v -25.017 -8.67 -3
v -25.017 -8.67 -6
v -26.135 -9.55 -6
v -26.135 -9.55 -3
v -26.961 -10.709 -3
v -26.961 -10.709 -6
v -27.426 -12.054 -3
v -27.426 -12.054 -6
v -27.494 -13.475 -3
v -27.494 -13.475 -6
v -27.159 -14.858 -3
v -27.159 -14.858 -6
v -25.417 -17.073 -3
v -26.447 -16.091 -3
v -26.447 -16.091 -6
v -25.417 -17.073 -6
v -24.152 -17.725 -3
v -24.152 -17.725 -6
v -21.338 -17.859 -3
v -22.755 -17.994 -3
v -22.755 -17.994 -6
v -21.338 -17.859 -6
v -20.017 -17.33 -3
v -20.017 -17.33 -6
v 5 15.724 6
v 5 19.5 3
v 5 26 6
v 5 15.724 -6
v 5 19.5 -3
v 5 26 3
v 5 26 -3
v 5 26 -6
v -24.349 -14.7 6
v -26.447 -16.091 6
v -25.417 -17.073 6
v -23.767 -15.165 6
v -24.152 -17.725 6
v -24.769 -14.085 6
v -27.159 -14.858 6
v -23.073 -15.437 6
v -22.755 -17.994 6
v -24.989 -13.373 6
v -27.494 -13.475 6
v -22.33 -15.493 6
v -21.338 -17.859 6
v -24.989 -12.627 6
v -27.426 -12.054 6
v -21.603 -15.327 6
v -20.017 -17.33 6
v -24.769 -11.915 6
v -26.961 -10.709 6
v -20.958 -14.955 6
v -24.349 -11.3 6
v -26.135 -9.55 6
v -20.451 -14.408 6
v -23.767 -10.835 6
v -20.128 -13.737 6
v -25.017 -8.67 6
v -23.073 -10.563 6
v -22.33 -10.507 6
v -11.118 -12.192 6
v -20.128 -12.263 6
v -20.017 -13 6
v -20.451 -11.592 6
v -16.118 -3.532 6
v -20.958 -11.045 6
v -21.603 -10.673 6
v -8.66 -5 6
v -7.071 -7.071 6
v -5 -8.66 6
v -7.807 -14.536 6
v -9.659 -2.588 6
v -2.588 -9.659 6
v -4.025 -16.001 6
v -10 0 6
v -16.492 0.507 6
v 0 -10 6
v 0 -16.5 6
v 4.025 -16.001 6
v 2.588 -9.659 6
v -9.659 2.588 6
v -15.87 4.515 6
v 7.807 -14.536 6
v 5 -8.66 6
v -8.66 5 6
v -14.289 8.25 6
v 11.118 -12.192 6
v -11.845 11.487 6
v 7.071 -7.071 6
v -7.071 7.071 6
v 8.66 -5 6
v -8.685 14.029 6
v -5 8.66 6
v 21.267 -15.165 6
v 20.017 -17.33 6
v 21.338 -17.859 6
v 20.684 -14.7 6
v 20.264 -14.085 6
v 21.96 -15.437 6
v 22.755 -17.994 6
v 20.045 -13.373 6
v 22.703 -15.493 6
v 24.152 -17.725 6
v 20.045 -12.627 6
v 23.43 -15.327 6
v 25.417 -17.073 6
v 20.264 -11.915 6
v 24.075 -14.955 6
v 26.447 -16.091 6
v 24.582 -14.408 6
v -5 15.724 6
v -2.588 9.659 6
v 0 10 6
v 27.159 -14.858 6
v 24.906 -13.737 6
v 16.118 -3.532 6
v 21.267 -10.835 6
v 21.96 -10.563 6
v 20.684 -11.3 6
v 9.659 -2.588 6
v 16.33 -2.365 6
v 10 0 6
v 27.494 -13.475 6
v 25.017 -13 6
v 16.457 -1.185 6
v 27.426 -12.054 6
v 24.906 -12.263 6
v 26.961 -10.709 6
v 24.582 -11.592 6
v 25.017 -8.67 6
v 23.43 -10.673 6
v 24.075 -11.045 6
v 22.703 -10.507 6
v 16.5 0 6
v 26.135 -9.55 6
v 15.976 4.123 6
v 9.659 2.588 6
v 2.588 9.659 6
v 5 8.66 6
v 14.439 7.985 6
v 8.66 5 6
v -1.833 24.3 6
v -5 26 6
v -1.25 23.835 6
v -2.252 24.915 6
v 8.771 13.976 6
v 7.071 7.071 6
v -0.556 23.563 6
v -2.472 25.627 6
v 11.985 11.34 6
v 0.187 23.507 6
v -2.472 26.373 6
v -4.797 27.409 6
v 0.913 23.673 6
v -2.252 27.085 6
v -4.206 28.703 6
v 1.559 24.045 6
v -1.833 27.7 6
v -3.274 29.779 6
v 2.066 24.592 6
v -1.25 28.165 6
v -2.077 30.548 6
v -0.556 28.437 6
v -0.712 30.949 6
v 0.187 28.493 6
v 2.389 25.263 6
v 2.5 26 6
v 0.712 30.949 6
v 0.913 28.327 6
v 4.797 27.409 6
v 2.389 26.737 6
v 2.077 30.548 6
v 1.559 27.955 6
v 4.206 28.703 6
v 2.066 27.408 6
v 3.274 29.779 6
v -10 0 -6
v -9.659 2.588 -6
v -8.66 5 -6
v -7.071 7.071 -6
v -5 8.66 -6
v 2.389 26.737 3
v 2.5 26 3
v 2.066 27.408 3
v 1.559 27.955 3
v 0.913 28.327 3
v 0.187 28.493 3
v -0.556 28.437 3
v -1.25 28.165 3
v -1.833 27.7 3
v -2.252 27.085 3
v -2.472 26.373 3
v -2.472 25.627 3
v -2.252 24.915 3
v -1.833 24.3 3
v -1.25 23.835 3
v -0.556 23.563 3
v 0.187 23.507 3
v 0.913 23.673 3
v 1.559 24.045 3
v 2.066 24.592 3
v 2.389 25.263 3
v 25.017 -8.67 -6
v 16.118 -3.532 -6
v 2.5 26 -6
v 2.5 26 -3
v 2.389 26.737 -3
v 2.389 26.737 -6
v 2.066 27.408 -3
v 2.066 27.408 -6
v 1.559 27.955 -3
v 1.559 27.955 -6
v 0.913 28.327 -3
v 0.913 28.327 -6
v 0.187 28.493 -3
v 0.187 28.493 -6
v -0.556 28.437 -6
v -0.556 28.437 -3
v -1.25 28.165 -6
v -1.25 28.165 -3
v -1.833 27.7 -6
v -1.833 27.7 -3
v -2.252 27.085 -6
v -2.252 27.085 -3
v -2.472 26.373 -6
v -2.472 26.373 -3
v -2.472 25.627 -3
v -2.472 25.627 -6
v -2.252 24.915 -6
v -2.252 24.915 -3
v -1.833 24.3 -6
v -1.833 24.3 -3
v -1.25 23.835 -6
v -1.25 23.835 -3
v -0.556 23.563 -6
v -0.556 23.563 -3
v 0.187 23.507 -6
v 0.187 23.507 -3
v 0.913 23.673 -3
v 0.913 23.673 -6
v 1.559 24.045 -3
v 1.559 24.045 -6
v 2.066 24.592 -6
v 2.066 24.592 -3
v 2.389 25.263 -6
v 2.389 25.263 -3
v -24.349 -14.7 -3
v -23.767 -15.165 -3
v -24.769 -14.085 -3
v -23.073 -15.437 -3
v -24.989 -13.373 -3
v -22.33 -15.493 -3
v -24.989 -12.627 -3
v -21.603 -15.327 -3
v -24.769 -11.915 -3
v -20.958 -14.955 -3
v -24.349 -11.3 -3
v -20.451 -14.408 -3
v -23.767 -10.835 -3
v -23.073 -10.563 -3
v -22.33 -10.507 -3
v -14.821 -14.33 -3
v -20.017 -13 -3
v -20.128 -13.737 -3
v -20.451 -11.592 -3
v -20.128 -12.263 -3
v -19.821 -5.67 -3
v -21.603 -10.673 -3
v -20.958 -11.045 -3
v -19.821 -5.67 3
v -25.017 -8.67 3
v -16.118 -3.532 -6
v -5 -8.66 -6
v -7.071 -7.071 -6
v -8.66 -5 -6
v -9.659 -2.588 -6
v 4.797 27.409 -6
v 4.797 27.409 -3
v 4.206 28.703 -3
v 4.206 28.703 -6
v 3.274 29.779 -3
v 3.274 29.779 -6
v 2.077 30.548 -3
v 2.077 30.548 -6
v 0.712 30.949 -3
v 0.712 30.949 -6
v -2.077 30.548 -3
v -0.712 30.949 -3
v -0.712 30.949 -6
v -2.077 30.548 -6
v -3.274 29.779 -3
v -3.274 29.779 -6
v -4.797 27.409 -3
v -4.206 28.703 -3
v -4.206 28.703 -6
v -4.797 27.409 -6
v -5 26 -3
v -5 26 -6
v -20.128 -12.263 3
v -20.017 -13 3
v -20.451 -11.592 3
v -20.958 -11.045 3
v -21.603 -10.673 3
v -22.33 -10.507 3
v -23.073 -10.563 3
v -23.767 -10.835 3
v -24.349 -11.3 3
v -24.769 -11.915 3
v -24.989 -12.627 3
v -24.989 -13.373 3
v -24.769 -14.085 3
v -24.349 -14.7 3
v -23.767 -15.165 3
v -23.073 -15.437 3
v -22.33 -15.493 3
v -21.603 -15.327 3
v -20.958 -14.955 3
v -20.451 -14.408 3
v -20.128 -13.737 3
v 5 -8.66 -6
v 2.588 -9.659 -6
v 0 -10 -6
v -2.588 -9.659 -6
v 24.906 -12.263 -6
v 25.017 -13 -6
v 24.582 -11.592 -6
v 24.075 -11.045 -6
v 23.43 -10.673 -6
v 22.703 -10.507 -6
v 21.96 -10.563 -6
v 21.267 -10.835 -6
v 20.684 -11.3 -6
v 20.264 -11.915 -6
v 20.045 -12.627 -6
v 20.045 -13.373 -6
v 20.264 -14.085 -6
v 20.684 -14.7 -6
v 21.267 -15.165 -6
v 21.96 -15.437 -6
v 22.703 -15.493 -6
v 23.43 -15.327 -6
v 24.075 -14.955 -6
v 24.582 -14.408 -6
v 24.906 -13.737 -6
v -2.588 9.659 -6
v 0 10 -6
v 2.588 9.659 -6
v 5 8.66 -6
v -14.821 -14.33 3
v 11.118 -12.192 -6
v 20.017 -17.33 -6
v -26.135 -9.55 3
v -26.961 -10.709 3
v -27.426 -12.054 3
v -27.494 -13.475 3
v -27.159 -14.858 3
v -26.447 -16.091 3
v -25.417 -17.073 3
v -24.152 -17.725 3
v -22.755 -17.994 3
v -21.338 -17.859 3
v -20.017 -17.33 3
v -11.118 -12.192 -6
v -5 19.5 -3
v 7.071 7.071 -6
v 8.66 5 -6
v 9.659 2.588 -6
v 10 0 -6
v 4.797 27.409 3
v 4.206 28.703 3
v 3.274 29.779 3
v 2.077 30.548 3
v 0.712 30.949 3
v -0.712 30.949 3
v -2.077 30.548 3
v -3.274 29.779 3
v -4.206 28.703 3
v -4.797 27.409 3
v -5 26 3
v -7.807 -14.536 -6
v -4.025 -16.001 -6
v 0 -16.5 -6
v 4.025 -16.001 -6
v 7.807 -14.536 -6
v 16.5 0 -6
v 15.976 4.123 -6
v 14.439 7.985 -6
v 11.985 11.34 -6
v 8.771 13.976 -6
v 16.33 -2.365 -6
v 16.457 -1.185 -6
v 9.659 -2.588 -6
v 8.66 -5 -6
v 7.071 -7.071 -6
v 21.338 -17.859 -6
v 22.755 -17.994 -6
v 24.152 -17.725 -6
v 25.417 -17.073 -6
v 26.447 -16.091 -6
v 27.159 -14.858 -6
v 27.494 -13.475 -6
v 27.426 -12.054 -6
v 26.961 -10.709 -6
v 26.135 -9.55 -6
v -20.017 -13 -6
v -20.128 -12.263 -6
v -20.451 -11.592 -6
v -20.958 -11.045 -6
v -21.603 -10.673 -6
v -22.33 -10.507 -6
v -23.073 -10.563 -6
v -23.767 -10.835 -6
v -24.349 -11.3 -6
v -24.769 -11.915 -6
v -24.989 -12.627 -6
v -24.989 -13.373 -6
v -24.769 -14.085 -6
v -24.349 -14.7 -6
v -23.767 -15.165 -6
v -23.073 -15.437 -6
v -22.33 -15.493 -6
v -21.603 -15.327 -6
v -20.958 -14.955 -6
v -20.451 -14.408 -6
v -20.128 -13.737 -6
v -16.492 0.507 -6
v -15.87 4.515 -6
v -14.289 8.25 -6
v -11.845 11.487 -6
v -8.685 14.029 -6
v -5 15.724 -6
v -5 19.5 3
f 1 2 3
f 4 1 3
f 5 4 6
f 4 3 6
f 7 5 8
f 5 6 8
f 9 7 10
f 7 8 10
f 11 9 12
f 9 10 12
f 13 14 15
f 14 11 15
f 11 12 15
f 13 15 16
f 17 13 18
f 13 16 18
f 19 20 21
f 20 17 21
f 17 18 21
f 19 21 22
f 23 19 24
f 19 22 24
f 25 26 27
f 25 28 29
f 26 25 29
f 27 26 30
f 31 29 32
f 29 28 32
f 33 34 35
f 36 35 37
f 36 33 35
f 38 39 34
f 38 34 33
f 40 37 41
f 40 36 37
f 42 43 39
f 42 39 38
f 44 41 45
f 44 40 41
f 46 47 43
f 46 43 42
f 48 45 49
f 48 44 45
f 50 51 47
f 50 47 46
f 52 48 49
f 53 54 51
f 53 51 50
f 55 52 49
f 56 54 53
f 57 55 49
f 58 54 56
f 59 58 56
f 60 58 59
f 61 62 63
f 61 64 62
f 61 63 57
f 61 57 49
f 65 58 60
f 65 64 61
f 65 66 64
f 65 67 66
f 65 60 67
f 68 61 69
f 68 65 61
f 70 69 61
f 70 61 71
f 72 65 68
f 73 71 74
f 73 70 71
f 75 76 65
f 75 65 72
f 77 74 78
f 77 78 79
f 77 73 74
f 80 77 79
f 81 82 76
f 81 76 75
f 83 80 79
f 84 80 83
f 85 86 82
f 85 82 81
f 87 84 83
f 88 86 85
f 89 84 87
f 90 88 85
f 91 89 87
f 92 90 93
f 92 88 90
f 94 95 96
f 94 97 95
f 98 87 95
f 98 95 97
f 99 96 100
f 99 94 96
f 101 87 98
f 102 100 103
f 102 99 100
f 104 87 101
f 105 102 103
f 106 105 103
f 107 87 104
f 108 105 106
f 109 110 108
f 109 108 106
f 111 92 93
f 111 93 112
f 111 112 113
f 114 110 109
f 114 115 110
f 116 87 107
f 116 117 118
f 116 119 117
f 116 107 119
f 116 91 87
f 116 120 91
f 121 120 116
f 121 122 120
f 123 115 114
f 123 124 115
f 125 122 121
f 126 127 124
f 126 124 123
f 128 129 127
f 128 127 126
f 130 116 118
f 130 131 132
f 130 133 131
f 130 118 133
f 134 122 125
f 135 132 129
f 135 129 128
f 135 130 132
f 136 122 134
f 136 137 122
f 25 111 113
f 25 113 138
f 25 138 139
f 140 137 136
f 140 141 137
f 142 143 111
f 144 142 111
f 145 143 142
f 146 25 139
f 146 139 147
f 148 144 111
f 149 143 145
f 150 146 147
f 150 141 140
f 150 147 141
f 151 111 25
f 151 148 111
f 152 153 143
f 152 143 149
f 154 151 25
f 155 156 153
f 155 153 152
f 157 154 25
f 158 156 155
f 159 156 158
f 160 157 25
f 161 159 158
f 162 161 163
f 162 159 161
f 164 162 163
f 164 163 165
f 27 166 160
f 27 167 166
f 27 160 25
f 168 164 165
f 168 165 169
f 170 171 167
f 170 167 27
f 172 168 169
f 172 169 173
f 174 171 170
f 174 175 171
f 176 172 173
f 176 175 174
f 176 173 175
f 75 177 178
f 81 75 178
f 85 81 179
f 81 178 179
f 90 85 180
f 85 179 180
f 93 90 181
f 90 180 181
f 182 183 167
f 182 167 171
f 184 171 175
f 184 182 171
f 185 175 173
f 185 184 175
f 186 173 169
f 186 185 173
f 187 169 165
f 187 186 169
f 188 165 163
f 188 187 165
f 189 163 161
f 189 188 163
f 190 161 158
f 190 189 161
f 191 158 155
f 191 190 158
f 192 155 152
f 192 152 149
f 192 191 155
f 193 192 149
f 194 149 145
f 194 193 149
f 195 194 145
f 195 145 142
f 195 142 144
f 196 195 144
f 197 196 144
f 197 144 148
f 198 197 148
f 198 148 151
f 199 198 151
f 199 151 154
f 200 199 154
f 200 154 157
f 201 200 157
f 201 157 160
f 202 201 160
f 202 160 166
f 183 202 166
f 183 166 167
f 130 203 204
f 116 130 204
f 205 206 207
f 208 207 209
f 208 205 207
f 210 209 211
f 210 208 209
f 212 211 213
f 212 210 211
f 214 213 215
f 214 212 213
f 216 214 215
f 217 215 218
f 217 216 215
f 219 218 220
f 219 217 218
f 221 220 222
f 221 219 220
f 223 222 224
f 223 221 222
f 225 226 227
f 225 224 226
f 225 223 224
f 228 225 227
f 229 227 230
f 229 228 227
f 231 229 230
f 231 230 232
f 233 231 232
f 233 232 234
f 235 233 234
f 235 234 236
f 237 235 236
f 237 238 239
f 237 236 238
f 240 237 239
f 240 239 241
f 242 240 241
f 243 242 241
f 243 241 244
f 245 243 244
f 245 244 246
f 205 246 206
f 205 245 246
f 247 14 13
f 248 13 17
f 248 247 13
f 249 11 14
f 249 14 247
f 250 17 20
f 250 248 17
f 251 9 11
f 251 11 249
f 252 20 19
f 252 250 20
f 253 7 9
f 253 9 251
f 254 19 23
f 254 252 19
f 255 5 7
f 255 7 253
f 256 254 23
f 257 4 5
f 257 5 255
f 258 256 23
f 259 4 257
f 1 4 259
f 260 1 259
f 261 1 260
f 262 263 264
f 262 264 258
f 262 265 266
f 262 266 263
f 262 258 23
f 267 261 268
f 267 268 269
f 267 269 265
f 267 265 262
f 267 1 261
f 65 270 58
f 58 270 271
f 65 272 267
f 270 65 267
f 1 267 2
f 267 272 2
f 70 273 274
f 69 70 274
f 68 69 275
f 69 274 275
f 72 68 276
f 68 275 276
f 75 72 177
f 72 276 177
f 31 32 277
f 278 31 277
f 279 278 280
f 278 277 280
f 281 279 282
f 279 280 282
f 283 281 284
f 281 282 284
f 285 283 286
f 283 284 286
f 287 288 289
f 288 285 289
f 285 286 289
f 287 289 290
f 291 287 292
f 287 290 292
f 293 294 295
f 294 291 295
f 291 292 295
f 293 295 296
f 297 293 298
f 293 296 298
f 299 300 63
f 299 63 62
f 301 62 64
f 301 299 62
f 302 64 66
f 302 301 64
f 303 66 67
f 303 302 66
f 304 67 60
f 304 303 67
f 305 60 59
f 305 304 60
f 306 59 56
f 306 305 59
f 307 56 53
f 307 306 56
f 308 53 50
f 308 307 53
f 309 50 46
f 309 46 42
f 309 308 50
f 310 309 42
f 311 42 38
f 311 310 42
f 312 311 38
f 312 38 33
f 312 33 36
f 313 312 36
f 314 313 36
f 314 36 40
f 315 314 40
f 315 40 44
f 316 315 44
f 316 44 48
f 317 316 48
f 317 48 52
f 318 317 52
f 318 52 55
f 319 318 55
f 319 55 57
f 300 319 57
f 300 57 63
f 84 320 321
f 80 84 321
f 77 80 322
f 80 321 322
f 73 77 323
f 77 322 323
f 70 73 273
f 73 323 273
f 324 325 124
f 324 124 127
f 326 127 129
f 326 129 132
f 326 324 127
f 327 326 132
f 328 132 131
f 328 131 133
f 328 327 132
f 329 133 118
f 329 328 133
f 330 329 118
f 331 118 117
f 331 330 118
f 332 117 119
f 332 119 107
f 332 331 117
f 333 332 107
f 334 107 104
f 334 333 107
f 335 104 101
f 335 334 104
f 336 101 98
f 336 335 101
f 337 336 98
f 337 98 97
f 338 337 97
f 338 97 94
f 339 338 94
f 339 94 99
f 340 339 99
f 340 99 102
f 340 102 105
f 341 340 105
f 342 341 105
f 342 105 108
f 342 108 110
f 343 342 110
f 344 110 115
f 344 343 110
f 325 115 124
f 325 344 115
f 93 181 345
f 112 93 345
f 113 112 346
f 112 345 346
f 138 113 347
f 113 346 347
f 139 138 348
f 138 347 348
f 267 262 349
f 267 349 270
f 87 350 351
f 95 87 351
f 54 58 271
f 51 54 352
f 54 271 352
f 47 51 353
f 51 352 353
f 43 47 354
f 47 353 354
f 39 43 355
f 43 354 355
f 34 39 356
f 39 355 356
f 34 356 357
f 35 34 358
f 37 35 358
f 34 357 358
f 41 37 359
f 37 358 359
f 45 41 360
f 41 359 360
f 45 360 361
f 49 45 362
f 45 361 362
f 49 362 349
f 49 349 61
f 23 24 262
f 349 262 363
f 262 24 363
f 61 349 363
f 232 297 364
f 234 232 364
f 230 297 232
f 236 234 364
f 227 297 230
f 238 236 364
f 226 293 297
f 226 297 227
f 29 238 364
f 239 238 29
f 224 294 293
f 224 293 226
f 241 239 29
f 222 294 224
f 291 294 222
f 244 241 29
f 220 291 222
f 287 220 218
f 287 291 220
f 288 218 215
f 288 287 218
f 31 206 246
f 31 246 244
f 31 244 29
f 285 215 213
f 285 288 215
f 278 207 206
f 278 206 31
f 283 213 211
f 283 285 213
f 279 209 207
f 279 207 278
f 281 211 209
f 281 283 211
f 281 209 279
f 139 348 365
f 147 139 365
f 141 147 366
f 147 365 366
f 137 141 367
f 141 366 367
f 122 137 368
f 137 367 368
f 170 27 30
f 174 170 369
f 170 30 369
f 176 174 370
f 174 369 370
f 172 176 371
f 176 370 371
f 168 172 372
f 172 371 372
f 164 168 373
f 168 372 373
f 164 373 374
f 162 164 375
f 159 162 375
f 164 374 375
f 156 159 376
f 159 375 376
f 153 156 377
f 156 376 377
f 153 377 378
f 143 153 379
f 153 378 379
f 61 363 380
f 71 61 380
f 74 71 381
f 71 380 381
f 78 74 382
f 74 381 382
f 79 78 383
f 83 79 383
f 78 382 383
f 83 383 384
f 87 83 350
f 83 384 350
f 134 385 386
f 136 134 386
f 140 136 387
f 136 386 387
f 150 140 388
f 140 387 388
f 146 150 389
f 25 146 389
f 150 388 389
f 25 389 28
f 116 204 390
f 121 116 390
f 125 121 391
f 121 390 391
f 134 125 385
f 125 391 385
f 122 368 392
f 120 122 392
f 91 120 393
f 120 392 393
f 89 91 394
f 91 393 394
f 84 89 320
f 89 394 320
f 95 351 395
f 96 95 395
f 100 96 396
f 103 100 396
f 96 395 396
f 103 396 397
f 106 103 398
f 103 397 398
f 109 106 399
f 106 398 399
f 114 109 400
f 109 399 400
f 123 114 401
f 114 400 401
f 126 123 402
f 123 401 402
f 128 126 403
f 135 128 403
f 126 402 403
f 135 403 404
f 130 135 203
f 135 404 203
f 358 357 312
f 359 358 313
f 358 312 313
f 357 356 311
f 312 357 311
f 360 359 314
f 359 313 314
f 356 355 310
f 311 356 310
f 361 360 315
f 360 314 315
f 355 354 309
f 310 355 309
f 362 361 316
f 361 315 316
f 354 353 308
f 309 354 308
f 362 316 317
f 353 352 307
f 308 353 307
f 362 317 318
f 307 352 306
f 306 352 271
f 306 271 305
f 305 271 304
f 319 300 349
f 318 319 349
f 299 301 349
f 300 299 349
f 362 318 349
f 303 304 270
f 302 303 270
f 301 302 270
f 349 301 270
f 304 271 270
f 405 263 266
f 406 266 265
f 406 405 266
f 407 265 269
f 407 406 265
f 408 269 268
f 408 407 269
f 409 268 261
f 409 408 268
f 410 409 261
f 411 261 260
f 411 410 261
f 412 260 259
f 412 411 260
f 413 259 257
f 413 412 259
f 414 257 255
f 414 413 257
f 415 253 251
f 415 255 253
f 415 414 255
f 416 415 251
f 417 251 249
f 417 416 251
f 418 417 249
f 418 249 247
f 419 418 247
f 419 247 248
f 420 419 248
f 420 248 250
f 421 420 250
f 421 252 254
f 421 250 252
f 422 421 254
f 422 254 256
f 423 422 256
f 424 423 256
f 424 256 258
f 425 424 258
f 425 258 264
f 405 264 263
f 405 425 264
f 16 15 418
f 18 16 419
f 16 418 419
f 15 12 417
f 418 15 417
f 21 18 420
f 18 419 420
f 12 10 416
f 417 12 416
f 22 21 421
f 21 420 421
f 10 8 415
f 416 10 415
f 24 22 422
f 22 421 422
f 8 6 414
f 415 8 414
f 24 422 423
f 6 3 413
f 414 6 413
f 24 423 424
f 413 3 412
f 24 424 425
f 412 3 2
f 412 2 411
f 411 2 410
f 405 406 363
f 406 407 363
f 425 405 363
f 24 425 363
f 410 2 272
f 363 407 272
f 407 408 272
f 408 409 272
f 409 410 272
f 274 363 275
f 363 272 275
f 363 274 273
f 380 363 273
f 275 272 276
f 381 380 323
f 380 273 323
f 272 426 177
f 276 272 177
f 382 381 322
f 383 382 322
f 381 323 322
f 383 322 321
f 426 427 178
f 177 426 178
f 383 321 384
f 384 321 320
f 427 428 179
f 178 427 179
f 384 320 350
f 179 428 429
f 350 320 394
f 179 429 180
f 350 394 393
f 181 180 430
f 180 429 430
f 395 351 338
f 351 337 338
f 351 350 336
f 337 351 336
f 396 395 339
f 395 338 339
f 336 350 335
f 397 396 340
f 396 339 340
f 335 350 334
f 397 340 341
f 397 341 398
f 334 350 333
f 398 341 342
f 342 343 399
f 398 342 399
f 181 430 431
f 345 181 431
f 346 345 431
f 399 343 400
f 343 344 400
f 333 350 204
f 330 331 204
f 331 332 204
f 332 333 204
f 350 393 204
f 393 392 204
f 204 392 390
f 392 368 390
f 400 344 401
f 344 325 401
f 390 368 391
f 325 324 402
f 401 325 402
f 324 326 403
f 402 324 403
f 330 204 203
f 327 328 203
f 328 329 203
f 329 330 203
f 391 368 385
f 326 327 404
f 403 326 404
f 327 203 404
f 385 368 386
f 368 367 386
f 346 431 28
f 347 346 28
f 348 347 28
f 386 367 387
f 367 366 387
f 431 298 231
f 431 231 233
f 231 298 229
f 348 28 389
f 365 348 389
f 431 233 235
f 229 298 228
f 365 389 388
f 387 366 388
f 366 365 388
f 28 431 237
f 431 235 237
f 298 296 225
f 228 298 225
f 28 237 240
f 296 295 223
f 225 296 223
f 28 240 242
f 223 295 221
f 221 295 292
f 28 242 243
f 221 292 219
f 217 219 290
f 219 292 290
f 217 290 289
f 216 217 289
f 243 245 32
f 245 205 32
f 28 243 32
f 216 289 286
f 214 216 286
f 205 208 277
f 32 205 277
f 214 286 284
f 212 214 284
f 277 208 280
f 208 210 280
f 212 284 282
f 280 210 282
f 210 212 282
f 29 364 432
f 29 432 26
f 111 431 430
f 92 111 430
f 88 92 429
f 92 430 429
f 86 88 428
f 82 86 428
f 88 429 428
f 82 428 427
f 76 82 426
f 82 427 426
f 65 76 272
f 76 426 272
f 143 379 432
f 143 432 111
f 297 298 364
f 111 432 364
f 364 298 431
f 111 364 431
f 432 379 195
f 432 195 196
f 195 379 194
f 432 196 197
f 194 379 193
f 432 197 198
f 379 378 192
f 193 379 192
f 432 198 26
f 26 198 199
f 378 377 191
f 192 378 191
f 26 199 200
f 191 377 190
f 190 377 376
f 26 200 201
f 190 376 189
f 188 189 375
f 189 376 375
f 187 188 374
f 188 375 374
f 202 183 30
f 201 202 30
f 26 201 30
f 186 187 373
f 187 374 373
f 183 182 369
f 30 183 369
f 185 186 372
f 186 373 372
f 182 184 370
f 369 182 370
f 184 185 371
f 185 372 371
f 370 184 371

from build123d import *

# Parameters (mm, degrees)
EXTRUDE_1_DEPTH          = 6
EXTRUDE_1_DEPTH_BACK     = 6
SKETCH_1_R               = 2.5
CUT_EXTRUDE_1_DEPTH      = 3
CUT_EXTRUDE_1_DEPTH_BACK = 3
SKETCH_2_W               = 15
SKETCH_2_H               = 13
CUT_EXTRUDE_2_DEPTH      = 6


with BuildPart() as part:
    # Эскиз1 → Бобышка-Вытянуть1 (new, two sides: drawn at the far end of the back side and taken through both)
    # profile 1 of 9: a face of its own
    with BuildSketch(Plane.XY.offset(-EXTRUDE_1_DEPTH_BACK)):
        with BuildLine():
            Line((5, 15.724185194), (5, 8.660254038))
            ThreePointArc((5, 8.660254038), (8.660254038, 5), (10, 0))
            Line((10, 0), (16.117543831, -3.531965578))
            ThreePointArc((16.117543831, -3.531965578), (16.404107309, -1.776306108), (16.5, 0))
            ThreePointArc((16.5, 0), (13.318220602, 9.740379869), (5, 15.724185194))
        make_face()
    # profile 2 of 9: a face of its own
    with BuildSketch(Plane.XY.offset(-EXTRUDE_1_DEPTH_BACK)):
        with BuildLine():
            Line((-5, 15.724185194), (-5, 8.660254038))
            ThreePointArc((-5, 8.660254038), (0, 10), (5, 8.660254038))
            Line((5, 8.660254038), (5, 15.724185194))
            ThreePointArc((5, 15.724185194), (0, 16.5), (-5, 15.724185194))
        make_face()
    # profile 3 of 9: a face of its own
    with BuildSketch(Plane.XY.offset(-EXTRUDE_1_DEPTH_BACK)):
        with BuildLine():
            ThreePointArc((-10, 0), (-8.660254038, 5), (-5, 8.660254038))
            Line((-5, 8.660254038), (-5, 15.724185194))
            ThreePointArc((-5, 15.724185194), (-14.289419162, 8.25), (-16.117543831, -3.531965578))
            Line((-16.117543831, -3.531965578), (-10, 0))
        make_face()
    # profile 4 of 9: a face of its own
    with BuildSketch(Plane.XY.offset(-EXTRUDE_1_DEPTH_BACK)):
        with BuildLine():
            ThreePointArc((-5, -8.660254038), (-8.660254038, -5), (-10, 0))
            Line((-10, 0), (-16.117543831, -3.531965578))
            ThreePointArc((-16.117543831, -3.531965578), (-14.289419162, -8.25), (-11.117543831, -12.192219616))
            Line((-11.117543831, -12.192219616), (-5, -8.660254038))
        make_face()
    # profile 5 of 9: a face of its own
    with BuildSketch(Plane.XY.offset(-EXTRUDE_1_DEPTH_BACK)):
        with BuildLine():
            ThreePointArc((5, -8.660254038), (0, -10), (-5, -8.660254038))
            Line((-5, -8.660254038), (-11.117543831, -12.192219616))
            ThreePointArc((-11.117543831, -12.192219616), (0, -16.5), (11.117543831, -12.192219616))
            Line((11.117543831, -12.192219616), (5, -8.660254038))
        make_face()
    # profile 6 of 9: a face of its own
    with BuildSketch(Plane.XY.offset(-EXTRUDE_1_DEPTH_BACK)):
        with BuildLine():
            ThreePointArc((10, 0), (8.660254038, -5), (5, -8.660254038))
            Line((5, -8.660254038), (11.117543831, -12.192219616))
            ThreePointArc((11.117543831, -12.192219616), (14.289419162, -8.25), (16.117543831, -3.531965578))
            Line((16.117543831, -3.531965578), (10, 0))
        make_face()
    # profile 7 of 9: a face of its own
    with BuildSketch(Plane.XY.offset(-EXTRUDE_1_DEPTH_BACK)):
        with BuildLine():
            ThreePointArc((16.117543831, -3.531965578), (14.289419162, -8.25), (11.117543831, -12.192219616))
            Line((11.117543831, -12.192219616), (20.016660498, -17.330127019))
            ThreePointArc((20.016660498, -17.330127019), (26.846787517, -15.5), (25.016660498, -8.669872981))
            Line((25.016660498, -8.669872981), (16.117543831, -3.531965578))
        make_face()
        with Locations((22.516660498, -13)):
            Circle(SKETCH_1_R, mode=Mode.SUBTRACT)
    # profile 8 of 9: a face of its own
    with BuildSketch(Plane.XY.offset(-EXTRUDE_1_DEPTH_BACK)):
        with BuildLine():
            ThreePointArc((-11.117543831, -12.192219616), (-14.289419162, -8.25), (-16.117543831, -3.531965578))
            Line((-16.117543831, -3.531965578), (-25.016660498, -8.669872981))
            ThreePointArc((-25.016660498, -8.669872981), (-26.846787517, -15.5), (-20.016660498, -17.330127019))
            Line((-20.016660498, -17.330127019), (-11.117543831, -12.192219616))
        make_face()
        with Locations((-22.516660498, -13)):
            Circle(SKETCH_1_R, mode=Mode.SUBTRACT)
    # profile 9 of 9: a face of its own
    with BuildSketch(Plane.XY.offset(-EXTRUDE_1_DEPTH_BACK)):
        with BuildLine():
            Line((-5, 26), (-5, 15.724185194))
            ThreePointArc((-5, 15.724185194), (0, 16.5), (5, 15.724185194))
            Line((5, 15.724185194), (5, 26))
            ThreePointArc((5, 26), (0, 31), (-5, 26))
        make_face()
        with Locations((0, 26)):
            Circle(SKETCH_1_R, mode=Mode.SUBTRACT)
    extrude(amount=EXTRUDE_1_DEPTH + EXTRUDE_1_DEPTH_BACK)

    # Эскиз2 → Вырез-Вытянуть1 (cut, two sides: drawn at the far end of the back side and taken through both)
    with BuildSketch(Plane.XY.offset(-CUT_EXTRUDE_1_DEPTH_BACK)):
        with Locations((0, 26)):
            Rectangle(SKETCH_2_W, SKETCH_2_H)
    extrude(amount=CUT_EXTRUDE_1_DEPTH + CUT_EXTRUDE_1_DEPTH_BACK, mode=Mode.SUBTRACT)

    # Эскиз3 → Вырез-Вытянуть2 (cut)
    with BuildSketch(Plane.XY.offset(-3)):
        Polygon((-22.212812921, -25.526279442), (-11.820508076, -19.526279442), (-22.820508076, -0.473720558), (-33.212812921, -6.473720558), align=None)
    extrude(amount=CUT_EXTRUDE_2_DEPTH, mode=Mode.SUBTRACT)


solid = part.part
